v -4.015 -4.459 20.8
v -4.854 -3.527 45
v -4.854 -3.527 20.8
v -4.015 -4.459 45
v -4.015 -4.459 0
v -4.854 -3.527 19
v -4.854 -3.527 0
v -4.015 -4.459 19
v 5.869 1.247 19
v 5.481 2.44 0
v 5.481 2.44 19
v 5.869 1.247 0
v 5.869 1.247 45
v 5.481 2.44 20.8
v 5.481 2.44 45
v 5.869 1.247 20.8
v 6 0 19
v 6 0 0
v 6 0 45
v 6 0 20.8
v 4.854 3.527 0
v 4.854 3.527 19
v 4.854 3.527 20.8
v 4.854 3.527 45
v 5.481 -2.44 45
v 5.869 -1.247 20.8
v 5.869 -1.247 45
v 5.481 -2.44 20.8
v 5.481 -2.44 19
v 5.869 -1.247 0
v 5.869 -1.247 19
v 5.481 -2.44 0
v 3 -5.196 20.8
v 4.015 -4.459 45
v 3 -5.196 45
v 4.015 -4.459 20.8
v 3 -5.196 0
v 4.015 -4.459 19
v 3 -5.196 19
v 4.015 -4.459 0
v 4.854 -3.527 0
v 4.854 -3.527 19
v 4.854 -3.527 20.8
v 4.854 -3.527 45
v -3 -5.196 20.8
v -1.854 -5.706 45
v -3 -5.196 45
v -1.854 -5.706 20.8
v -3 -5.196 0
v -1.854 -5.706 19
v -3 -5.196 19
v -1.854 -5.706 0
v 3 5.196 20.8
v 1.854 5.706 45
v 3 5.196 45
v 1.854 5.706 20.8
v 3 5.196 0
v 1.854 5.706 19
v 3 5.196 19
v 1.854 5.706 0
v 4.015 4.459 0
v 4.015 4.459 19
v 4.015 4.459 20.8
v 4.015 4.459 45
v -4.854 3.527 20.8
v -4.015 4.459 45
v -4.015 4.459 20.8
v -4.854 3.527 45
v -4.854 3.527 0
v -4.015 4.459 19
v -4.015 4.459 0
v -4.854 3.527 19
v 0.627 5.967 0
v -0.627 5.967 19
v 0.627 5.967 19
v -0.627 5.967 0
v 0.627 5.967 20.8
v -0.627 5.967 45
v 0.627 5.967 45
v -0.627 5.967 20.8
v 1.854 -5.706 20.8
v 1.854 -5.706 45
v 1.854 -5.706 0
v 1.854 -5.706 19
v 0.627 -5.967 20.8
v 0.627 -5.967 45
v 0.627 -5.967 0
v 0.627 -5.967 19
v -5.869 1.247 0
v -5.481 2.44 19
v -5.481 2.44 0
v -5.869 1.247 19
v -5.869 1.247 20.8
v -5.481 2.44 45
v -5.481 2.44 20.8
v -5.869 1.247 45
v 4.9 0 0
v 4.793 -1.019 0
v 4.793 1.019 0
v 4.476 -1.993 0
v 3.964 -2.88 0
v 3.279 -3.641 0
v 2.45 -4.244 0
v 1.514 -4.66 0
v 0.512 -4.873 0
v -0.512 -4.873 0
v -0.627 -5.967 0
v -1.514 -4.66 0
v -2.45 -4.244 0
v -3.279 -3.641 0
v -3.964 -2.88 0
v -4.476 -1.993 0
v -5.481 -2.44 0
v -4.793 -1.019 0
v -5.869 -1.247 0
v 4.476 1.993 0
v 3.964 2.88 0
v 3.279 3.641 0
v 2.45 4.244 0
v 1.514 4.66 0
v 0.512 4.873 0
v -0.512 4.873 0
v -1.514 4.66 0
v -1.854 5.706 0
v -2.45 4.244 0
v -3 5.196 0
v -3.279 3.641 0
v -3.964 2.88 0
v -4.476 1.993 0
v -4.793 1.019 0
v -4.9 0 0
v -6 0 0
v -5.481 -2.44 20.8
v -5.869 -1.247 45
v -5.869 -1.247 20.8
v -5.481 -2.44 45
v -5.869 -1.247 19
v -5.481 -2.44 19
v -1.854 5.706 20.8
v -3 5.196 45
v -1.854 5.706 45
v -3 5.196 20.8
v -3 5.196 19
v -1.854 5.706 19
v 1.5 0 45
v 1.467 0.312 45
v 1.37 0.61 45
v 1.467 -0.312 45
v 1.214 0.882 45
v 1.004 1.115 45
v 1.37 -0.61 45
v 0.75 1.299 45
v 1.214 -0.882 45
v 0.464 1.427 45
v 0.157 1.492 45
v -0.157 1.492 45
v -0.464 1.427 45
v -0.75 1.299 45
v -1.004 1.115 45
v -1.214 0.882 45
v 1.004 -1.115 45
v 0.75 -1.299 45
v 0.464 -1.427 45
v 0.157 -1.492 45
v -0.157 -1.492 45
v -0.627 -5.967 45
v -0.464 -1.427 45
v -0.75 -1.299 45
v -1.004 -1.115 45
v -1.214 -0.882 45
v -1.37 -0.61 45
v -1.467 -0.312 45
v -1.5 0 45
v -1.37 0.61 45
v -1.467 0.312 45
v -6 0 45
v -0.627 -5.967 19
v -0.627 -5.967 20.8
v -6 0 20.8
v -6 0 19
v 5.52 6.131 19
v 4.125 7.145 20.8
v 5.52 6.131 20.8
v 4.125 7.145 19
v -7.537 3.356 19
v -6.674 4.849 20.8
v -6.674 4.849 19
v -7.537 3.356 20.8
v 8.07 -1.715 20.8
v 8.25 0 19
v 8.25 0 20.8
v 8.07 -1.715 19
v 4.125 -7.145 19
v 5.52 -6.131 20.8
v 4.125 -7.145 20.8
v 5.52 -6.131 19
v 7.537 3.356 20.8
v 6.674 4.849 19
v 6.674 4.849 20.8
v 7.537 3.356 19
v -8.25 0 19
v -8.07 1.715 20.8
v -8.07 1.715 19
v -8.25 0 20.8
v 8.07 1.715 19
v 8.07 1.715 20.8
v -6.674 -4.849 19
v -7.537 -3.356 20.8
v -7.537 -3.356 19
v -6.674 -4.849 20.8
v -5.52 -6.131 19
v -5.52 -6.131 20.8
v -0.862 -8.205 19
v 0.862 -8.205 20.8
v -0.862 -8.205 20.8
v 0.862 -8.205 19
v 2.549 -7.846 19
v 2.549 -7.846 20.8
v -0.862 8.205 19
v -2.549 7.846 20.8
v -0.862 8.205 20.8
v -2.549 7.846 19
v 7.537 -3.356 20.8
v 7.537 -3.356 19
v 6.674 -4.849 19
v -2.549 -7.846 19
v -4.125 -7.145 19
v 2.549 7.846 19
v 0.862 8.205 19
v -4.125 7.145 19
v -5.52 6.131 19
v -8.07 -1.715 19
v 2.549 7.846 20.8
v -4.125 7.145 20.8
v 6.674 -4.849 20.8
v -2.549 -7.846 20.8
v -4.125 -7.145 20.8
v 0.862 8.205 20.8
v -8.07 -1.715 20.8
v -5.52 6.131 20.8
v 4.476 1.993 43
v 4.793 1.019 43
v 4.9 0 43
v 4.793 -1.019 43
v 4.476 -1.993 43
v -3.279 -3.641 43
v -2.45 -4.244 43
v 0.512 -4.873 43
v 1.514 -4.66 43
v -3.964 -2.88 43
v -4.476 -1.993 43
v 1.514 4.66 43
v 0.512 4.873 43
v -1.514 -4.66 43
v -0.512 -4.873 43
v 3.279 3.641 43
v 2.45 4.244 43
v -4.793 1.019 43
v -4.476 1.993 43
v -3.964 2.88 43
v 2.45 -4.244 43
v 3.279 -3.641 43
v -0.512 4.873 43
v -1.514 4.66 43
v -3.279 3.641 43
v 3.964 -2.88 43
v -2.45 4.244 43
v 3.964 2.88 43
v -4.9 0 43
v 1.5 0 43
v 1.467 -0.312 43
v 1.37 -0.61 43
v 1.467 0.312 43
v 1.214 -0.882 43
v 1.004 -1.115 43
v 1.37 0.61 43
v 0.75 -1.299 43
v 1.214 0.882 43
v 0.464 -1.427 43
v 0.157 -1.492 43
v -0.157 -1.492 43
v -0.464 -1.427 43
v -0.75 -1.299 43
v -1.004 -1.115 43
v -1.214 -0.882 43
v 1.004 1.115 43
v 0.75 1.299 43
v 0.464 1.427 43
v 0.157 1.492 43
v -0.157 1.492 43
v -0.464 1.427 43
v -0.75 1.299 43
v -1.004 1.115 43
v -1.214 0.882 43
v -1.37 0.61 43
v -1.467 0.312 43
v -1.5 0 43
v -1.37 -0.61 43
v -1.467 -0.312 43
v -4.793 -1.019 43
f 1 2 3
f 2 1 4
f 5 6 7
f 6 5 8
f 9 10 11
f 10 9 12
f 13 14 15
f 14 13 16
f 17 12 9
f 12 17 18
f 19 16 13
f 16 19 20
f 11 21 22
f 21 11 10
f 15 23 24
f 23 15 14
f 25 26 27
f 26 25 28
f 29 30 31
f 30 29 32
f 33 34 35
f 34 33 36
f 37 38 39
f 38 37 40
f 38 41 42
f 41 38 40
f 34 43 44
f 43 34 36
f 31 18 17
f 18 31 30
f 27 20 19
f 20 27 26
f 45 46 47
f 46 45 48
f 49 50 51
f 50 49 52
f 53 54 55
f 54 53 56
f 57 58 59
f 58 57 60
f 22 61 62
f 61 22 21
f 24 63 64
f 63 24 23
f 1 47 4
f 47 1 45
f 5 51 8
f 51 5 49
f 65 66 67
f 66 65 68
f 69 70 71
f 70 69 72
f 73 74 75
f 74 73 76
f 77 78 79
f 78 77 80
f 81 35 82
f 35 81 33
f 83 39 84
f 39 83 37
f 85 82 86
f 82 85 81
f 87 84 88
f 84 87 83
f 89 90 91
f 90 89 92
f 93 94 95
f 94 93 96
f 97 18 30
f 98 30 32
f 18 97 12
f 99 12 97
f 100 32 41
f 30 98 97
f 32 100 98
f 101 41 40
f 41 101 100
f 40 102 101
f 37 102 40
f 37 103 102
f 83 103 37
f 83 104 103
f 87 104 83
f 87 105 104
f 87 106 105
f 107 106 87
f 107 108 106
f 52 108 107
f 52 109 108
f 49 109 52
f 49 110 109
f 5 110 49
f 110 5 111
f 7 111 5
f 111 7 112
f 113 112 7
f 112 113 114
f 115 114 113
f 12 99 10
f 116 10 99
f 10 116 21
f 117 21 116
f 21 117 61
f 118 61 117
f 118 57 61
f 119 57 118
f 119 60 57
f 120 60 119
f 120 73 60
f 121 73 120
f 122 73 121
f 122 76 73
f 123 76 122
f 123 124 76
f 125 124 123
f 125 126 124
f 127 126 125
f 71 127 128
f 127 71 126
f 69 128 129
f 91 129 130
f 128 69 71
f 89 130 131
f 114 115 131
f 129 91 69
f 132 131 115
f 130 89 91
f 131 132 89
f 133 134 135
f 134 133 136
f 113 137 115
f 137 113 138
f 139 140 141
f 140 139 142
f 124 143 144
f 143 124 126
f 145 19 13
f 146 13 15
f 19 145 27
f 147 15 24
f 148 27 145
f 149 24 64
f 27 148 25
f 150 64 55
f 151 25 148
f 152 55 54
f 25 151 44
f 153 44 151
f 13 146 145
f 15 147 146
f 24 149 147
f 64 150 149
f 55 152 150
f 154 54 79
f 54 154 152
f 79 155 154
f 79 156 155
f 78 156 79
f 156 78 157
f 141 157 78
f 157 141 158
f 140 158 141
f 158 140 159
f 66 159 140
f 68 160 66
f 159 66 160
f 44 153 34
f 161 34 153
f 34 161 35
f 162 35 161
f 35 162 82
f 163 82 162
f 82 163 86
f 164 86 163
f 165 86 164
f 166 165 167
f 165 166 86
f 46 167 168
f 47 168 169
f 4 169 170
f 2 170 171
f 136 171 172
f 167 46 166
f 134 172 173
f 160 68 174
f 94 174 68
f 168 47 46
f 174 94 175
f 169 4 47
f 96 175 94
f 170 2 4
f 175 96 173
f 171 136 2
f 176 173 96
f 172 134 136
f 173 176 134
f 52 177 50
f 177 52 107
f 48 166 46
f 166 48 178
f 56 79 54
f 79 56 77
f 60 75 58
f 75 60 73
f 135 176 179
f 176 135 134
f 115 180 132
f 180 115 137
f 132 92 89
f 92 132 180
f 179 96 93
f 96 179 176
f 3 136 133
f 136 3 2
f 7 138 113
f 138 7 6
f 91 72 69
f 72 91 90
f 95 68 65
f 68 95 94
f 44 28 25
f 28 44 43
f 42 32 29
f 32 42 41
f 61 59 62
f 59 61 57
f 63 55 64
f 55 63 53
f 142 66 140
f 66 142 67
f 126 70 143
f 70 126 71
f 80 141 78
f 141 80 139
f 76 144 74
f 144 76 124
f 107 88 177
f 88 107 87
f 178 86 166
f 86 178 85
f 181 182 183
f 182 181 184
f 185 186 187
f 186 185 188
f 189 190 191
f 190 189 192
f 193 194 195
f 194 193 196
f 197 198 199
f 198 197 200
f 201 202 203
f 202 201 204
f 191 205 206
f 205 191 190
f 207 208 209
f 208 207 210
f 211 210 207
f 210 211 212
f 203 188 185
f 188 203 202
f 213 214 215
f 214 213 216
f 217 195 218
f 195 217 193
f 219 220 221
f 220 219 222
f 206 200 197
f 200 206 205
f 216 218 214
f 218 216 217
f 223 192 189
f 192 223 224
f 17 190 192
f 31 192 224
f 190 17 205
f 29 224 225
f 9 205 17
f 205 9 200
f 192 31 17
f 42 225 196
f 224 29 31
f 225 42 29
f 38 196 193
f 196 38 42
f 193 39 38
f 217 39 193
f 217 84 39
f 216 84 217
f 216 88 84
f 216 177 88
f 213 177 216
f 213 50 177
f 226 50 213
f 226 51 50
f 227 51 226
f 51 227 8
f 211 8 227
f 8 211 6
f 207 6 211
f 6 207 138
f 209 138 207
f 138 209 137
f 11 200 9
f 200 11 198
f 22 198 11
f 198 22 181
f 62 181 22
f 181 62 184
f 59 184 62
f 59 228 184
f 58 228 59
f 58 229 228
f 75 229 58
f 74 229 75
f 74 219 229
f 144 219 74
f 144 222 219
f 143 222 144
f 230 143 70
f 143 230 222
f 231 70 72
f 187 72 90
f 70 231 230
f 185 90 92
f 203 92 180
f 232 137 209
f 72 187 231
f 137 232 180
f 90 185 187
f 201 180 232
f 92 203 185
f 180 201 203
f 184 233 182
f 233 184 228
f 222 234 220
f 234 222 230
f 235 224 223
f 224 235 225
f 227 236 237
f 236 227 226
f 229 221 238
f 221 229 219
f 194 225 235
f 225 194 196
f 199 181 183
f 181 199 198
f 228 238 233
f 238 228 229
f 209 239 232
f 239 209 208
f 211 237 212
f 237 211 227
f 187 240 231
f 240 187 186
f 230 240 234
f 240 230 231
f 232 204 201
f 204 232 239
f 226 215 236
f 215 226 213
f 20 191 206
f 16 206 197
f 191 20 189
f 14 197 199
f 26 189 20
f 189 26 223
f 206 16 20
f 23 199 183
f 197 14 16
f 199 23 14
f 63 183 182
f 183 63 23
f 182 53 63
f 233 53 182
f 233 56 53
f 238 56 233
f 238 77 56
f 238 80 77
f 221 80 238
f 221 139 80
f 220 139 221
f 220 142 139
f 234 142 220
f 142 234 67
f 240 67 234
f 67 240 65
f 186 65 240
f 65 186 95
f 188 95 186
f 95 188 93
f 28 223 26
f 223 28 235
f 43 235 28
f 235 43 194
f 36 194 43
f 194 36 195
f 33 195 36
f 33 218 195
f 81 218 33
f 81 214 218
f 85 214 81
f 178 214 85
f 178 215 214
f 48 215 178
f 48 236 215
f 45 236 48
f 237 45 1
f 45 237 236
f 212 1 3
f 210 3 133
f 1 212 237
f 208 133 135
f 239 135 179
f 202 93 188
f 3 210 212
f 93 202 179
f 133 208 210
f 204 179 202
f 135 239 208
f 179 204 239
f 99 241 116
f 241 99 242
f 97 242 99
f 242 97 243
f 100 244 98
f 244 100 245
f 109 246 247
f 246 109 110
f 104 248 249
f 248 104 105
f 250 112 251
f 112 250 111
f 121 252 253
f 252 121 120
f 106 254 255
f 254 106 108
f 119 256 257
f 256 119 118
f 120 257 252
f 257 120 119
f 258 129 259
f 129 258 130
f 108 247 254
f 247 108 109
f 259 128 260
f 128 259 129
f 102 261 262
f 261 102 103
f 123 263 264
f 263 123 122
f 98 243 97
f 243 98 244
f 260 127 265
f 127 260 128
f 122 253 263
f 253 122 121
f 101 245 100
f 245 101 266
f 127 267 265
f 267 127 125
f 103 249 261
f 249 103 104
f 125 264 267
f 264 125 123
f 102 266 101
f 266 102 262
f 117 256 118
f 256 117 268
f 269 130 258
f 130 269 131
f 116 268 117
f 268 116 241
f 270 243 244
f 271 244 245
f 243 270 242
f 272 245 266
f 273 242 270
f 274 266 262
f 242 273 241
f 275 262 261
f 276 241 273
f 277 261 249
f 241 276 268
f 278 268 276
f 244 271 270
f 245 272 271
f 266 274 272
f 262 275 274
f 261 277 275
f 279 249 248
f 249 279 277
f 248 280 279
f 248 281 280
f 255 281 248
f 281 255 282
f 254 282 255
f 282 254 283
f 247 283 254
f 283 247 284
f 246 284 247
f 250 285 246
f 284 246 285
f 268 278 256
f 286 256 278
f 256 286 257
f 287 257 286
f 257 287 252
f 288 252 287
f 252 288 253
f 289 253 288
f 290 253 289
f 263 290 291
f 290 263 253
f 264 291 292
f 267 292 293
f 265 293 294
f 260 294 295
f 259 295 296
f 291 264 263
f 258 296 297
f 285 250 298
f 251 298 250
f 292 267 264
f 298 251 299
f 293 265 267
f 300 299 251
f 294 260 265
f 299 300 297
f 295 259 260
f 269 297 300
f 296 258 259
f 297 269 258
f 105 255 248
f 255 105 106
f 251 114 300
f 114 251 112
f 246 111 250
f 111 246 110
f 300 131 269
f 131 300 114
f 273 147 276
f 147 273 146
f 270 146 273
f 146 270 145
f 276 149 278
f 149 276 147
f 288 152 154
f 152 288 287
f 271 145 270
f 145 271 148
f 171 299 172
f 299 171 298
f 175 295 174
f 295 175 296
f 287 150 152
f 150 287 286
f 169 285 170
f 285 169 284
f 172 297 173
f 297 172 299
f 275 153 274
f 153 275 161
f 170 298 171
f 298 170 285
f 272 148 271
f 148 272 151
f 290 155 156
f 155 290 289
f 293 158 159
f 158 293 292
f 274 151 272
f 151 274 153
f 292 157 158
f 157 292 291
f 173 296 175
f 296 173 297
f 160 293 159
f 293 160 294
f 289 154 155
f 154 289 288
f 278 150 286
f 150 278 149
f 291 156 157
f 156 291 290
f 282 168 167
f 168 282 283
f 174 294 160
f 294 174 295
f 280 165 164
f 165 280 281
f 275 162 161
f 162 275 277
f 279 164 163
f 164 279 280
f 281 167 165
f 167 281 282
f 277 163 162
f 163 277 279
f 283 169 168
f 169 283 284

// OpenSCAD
use <MCAD/regular_shapes.scad>
$fs = 0.01;

module penholder(height=45) {
  difference() {
    difference() {
      union() {
        cylinder(h=height, r=12/2); // lange omtrek
        translate([0,0,12+7]) {
          cylinder(h=1.8, r=16.5/2); //bredere stuk
        }
      }
      cylinder(h=height - 2, r=10/2 - 0.1);
    }
    cylinder(h=height, r=3/2); // ronde, kleine uitsnede
  }
}
penholder();
